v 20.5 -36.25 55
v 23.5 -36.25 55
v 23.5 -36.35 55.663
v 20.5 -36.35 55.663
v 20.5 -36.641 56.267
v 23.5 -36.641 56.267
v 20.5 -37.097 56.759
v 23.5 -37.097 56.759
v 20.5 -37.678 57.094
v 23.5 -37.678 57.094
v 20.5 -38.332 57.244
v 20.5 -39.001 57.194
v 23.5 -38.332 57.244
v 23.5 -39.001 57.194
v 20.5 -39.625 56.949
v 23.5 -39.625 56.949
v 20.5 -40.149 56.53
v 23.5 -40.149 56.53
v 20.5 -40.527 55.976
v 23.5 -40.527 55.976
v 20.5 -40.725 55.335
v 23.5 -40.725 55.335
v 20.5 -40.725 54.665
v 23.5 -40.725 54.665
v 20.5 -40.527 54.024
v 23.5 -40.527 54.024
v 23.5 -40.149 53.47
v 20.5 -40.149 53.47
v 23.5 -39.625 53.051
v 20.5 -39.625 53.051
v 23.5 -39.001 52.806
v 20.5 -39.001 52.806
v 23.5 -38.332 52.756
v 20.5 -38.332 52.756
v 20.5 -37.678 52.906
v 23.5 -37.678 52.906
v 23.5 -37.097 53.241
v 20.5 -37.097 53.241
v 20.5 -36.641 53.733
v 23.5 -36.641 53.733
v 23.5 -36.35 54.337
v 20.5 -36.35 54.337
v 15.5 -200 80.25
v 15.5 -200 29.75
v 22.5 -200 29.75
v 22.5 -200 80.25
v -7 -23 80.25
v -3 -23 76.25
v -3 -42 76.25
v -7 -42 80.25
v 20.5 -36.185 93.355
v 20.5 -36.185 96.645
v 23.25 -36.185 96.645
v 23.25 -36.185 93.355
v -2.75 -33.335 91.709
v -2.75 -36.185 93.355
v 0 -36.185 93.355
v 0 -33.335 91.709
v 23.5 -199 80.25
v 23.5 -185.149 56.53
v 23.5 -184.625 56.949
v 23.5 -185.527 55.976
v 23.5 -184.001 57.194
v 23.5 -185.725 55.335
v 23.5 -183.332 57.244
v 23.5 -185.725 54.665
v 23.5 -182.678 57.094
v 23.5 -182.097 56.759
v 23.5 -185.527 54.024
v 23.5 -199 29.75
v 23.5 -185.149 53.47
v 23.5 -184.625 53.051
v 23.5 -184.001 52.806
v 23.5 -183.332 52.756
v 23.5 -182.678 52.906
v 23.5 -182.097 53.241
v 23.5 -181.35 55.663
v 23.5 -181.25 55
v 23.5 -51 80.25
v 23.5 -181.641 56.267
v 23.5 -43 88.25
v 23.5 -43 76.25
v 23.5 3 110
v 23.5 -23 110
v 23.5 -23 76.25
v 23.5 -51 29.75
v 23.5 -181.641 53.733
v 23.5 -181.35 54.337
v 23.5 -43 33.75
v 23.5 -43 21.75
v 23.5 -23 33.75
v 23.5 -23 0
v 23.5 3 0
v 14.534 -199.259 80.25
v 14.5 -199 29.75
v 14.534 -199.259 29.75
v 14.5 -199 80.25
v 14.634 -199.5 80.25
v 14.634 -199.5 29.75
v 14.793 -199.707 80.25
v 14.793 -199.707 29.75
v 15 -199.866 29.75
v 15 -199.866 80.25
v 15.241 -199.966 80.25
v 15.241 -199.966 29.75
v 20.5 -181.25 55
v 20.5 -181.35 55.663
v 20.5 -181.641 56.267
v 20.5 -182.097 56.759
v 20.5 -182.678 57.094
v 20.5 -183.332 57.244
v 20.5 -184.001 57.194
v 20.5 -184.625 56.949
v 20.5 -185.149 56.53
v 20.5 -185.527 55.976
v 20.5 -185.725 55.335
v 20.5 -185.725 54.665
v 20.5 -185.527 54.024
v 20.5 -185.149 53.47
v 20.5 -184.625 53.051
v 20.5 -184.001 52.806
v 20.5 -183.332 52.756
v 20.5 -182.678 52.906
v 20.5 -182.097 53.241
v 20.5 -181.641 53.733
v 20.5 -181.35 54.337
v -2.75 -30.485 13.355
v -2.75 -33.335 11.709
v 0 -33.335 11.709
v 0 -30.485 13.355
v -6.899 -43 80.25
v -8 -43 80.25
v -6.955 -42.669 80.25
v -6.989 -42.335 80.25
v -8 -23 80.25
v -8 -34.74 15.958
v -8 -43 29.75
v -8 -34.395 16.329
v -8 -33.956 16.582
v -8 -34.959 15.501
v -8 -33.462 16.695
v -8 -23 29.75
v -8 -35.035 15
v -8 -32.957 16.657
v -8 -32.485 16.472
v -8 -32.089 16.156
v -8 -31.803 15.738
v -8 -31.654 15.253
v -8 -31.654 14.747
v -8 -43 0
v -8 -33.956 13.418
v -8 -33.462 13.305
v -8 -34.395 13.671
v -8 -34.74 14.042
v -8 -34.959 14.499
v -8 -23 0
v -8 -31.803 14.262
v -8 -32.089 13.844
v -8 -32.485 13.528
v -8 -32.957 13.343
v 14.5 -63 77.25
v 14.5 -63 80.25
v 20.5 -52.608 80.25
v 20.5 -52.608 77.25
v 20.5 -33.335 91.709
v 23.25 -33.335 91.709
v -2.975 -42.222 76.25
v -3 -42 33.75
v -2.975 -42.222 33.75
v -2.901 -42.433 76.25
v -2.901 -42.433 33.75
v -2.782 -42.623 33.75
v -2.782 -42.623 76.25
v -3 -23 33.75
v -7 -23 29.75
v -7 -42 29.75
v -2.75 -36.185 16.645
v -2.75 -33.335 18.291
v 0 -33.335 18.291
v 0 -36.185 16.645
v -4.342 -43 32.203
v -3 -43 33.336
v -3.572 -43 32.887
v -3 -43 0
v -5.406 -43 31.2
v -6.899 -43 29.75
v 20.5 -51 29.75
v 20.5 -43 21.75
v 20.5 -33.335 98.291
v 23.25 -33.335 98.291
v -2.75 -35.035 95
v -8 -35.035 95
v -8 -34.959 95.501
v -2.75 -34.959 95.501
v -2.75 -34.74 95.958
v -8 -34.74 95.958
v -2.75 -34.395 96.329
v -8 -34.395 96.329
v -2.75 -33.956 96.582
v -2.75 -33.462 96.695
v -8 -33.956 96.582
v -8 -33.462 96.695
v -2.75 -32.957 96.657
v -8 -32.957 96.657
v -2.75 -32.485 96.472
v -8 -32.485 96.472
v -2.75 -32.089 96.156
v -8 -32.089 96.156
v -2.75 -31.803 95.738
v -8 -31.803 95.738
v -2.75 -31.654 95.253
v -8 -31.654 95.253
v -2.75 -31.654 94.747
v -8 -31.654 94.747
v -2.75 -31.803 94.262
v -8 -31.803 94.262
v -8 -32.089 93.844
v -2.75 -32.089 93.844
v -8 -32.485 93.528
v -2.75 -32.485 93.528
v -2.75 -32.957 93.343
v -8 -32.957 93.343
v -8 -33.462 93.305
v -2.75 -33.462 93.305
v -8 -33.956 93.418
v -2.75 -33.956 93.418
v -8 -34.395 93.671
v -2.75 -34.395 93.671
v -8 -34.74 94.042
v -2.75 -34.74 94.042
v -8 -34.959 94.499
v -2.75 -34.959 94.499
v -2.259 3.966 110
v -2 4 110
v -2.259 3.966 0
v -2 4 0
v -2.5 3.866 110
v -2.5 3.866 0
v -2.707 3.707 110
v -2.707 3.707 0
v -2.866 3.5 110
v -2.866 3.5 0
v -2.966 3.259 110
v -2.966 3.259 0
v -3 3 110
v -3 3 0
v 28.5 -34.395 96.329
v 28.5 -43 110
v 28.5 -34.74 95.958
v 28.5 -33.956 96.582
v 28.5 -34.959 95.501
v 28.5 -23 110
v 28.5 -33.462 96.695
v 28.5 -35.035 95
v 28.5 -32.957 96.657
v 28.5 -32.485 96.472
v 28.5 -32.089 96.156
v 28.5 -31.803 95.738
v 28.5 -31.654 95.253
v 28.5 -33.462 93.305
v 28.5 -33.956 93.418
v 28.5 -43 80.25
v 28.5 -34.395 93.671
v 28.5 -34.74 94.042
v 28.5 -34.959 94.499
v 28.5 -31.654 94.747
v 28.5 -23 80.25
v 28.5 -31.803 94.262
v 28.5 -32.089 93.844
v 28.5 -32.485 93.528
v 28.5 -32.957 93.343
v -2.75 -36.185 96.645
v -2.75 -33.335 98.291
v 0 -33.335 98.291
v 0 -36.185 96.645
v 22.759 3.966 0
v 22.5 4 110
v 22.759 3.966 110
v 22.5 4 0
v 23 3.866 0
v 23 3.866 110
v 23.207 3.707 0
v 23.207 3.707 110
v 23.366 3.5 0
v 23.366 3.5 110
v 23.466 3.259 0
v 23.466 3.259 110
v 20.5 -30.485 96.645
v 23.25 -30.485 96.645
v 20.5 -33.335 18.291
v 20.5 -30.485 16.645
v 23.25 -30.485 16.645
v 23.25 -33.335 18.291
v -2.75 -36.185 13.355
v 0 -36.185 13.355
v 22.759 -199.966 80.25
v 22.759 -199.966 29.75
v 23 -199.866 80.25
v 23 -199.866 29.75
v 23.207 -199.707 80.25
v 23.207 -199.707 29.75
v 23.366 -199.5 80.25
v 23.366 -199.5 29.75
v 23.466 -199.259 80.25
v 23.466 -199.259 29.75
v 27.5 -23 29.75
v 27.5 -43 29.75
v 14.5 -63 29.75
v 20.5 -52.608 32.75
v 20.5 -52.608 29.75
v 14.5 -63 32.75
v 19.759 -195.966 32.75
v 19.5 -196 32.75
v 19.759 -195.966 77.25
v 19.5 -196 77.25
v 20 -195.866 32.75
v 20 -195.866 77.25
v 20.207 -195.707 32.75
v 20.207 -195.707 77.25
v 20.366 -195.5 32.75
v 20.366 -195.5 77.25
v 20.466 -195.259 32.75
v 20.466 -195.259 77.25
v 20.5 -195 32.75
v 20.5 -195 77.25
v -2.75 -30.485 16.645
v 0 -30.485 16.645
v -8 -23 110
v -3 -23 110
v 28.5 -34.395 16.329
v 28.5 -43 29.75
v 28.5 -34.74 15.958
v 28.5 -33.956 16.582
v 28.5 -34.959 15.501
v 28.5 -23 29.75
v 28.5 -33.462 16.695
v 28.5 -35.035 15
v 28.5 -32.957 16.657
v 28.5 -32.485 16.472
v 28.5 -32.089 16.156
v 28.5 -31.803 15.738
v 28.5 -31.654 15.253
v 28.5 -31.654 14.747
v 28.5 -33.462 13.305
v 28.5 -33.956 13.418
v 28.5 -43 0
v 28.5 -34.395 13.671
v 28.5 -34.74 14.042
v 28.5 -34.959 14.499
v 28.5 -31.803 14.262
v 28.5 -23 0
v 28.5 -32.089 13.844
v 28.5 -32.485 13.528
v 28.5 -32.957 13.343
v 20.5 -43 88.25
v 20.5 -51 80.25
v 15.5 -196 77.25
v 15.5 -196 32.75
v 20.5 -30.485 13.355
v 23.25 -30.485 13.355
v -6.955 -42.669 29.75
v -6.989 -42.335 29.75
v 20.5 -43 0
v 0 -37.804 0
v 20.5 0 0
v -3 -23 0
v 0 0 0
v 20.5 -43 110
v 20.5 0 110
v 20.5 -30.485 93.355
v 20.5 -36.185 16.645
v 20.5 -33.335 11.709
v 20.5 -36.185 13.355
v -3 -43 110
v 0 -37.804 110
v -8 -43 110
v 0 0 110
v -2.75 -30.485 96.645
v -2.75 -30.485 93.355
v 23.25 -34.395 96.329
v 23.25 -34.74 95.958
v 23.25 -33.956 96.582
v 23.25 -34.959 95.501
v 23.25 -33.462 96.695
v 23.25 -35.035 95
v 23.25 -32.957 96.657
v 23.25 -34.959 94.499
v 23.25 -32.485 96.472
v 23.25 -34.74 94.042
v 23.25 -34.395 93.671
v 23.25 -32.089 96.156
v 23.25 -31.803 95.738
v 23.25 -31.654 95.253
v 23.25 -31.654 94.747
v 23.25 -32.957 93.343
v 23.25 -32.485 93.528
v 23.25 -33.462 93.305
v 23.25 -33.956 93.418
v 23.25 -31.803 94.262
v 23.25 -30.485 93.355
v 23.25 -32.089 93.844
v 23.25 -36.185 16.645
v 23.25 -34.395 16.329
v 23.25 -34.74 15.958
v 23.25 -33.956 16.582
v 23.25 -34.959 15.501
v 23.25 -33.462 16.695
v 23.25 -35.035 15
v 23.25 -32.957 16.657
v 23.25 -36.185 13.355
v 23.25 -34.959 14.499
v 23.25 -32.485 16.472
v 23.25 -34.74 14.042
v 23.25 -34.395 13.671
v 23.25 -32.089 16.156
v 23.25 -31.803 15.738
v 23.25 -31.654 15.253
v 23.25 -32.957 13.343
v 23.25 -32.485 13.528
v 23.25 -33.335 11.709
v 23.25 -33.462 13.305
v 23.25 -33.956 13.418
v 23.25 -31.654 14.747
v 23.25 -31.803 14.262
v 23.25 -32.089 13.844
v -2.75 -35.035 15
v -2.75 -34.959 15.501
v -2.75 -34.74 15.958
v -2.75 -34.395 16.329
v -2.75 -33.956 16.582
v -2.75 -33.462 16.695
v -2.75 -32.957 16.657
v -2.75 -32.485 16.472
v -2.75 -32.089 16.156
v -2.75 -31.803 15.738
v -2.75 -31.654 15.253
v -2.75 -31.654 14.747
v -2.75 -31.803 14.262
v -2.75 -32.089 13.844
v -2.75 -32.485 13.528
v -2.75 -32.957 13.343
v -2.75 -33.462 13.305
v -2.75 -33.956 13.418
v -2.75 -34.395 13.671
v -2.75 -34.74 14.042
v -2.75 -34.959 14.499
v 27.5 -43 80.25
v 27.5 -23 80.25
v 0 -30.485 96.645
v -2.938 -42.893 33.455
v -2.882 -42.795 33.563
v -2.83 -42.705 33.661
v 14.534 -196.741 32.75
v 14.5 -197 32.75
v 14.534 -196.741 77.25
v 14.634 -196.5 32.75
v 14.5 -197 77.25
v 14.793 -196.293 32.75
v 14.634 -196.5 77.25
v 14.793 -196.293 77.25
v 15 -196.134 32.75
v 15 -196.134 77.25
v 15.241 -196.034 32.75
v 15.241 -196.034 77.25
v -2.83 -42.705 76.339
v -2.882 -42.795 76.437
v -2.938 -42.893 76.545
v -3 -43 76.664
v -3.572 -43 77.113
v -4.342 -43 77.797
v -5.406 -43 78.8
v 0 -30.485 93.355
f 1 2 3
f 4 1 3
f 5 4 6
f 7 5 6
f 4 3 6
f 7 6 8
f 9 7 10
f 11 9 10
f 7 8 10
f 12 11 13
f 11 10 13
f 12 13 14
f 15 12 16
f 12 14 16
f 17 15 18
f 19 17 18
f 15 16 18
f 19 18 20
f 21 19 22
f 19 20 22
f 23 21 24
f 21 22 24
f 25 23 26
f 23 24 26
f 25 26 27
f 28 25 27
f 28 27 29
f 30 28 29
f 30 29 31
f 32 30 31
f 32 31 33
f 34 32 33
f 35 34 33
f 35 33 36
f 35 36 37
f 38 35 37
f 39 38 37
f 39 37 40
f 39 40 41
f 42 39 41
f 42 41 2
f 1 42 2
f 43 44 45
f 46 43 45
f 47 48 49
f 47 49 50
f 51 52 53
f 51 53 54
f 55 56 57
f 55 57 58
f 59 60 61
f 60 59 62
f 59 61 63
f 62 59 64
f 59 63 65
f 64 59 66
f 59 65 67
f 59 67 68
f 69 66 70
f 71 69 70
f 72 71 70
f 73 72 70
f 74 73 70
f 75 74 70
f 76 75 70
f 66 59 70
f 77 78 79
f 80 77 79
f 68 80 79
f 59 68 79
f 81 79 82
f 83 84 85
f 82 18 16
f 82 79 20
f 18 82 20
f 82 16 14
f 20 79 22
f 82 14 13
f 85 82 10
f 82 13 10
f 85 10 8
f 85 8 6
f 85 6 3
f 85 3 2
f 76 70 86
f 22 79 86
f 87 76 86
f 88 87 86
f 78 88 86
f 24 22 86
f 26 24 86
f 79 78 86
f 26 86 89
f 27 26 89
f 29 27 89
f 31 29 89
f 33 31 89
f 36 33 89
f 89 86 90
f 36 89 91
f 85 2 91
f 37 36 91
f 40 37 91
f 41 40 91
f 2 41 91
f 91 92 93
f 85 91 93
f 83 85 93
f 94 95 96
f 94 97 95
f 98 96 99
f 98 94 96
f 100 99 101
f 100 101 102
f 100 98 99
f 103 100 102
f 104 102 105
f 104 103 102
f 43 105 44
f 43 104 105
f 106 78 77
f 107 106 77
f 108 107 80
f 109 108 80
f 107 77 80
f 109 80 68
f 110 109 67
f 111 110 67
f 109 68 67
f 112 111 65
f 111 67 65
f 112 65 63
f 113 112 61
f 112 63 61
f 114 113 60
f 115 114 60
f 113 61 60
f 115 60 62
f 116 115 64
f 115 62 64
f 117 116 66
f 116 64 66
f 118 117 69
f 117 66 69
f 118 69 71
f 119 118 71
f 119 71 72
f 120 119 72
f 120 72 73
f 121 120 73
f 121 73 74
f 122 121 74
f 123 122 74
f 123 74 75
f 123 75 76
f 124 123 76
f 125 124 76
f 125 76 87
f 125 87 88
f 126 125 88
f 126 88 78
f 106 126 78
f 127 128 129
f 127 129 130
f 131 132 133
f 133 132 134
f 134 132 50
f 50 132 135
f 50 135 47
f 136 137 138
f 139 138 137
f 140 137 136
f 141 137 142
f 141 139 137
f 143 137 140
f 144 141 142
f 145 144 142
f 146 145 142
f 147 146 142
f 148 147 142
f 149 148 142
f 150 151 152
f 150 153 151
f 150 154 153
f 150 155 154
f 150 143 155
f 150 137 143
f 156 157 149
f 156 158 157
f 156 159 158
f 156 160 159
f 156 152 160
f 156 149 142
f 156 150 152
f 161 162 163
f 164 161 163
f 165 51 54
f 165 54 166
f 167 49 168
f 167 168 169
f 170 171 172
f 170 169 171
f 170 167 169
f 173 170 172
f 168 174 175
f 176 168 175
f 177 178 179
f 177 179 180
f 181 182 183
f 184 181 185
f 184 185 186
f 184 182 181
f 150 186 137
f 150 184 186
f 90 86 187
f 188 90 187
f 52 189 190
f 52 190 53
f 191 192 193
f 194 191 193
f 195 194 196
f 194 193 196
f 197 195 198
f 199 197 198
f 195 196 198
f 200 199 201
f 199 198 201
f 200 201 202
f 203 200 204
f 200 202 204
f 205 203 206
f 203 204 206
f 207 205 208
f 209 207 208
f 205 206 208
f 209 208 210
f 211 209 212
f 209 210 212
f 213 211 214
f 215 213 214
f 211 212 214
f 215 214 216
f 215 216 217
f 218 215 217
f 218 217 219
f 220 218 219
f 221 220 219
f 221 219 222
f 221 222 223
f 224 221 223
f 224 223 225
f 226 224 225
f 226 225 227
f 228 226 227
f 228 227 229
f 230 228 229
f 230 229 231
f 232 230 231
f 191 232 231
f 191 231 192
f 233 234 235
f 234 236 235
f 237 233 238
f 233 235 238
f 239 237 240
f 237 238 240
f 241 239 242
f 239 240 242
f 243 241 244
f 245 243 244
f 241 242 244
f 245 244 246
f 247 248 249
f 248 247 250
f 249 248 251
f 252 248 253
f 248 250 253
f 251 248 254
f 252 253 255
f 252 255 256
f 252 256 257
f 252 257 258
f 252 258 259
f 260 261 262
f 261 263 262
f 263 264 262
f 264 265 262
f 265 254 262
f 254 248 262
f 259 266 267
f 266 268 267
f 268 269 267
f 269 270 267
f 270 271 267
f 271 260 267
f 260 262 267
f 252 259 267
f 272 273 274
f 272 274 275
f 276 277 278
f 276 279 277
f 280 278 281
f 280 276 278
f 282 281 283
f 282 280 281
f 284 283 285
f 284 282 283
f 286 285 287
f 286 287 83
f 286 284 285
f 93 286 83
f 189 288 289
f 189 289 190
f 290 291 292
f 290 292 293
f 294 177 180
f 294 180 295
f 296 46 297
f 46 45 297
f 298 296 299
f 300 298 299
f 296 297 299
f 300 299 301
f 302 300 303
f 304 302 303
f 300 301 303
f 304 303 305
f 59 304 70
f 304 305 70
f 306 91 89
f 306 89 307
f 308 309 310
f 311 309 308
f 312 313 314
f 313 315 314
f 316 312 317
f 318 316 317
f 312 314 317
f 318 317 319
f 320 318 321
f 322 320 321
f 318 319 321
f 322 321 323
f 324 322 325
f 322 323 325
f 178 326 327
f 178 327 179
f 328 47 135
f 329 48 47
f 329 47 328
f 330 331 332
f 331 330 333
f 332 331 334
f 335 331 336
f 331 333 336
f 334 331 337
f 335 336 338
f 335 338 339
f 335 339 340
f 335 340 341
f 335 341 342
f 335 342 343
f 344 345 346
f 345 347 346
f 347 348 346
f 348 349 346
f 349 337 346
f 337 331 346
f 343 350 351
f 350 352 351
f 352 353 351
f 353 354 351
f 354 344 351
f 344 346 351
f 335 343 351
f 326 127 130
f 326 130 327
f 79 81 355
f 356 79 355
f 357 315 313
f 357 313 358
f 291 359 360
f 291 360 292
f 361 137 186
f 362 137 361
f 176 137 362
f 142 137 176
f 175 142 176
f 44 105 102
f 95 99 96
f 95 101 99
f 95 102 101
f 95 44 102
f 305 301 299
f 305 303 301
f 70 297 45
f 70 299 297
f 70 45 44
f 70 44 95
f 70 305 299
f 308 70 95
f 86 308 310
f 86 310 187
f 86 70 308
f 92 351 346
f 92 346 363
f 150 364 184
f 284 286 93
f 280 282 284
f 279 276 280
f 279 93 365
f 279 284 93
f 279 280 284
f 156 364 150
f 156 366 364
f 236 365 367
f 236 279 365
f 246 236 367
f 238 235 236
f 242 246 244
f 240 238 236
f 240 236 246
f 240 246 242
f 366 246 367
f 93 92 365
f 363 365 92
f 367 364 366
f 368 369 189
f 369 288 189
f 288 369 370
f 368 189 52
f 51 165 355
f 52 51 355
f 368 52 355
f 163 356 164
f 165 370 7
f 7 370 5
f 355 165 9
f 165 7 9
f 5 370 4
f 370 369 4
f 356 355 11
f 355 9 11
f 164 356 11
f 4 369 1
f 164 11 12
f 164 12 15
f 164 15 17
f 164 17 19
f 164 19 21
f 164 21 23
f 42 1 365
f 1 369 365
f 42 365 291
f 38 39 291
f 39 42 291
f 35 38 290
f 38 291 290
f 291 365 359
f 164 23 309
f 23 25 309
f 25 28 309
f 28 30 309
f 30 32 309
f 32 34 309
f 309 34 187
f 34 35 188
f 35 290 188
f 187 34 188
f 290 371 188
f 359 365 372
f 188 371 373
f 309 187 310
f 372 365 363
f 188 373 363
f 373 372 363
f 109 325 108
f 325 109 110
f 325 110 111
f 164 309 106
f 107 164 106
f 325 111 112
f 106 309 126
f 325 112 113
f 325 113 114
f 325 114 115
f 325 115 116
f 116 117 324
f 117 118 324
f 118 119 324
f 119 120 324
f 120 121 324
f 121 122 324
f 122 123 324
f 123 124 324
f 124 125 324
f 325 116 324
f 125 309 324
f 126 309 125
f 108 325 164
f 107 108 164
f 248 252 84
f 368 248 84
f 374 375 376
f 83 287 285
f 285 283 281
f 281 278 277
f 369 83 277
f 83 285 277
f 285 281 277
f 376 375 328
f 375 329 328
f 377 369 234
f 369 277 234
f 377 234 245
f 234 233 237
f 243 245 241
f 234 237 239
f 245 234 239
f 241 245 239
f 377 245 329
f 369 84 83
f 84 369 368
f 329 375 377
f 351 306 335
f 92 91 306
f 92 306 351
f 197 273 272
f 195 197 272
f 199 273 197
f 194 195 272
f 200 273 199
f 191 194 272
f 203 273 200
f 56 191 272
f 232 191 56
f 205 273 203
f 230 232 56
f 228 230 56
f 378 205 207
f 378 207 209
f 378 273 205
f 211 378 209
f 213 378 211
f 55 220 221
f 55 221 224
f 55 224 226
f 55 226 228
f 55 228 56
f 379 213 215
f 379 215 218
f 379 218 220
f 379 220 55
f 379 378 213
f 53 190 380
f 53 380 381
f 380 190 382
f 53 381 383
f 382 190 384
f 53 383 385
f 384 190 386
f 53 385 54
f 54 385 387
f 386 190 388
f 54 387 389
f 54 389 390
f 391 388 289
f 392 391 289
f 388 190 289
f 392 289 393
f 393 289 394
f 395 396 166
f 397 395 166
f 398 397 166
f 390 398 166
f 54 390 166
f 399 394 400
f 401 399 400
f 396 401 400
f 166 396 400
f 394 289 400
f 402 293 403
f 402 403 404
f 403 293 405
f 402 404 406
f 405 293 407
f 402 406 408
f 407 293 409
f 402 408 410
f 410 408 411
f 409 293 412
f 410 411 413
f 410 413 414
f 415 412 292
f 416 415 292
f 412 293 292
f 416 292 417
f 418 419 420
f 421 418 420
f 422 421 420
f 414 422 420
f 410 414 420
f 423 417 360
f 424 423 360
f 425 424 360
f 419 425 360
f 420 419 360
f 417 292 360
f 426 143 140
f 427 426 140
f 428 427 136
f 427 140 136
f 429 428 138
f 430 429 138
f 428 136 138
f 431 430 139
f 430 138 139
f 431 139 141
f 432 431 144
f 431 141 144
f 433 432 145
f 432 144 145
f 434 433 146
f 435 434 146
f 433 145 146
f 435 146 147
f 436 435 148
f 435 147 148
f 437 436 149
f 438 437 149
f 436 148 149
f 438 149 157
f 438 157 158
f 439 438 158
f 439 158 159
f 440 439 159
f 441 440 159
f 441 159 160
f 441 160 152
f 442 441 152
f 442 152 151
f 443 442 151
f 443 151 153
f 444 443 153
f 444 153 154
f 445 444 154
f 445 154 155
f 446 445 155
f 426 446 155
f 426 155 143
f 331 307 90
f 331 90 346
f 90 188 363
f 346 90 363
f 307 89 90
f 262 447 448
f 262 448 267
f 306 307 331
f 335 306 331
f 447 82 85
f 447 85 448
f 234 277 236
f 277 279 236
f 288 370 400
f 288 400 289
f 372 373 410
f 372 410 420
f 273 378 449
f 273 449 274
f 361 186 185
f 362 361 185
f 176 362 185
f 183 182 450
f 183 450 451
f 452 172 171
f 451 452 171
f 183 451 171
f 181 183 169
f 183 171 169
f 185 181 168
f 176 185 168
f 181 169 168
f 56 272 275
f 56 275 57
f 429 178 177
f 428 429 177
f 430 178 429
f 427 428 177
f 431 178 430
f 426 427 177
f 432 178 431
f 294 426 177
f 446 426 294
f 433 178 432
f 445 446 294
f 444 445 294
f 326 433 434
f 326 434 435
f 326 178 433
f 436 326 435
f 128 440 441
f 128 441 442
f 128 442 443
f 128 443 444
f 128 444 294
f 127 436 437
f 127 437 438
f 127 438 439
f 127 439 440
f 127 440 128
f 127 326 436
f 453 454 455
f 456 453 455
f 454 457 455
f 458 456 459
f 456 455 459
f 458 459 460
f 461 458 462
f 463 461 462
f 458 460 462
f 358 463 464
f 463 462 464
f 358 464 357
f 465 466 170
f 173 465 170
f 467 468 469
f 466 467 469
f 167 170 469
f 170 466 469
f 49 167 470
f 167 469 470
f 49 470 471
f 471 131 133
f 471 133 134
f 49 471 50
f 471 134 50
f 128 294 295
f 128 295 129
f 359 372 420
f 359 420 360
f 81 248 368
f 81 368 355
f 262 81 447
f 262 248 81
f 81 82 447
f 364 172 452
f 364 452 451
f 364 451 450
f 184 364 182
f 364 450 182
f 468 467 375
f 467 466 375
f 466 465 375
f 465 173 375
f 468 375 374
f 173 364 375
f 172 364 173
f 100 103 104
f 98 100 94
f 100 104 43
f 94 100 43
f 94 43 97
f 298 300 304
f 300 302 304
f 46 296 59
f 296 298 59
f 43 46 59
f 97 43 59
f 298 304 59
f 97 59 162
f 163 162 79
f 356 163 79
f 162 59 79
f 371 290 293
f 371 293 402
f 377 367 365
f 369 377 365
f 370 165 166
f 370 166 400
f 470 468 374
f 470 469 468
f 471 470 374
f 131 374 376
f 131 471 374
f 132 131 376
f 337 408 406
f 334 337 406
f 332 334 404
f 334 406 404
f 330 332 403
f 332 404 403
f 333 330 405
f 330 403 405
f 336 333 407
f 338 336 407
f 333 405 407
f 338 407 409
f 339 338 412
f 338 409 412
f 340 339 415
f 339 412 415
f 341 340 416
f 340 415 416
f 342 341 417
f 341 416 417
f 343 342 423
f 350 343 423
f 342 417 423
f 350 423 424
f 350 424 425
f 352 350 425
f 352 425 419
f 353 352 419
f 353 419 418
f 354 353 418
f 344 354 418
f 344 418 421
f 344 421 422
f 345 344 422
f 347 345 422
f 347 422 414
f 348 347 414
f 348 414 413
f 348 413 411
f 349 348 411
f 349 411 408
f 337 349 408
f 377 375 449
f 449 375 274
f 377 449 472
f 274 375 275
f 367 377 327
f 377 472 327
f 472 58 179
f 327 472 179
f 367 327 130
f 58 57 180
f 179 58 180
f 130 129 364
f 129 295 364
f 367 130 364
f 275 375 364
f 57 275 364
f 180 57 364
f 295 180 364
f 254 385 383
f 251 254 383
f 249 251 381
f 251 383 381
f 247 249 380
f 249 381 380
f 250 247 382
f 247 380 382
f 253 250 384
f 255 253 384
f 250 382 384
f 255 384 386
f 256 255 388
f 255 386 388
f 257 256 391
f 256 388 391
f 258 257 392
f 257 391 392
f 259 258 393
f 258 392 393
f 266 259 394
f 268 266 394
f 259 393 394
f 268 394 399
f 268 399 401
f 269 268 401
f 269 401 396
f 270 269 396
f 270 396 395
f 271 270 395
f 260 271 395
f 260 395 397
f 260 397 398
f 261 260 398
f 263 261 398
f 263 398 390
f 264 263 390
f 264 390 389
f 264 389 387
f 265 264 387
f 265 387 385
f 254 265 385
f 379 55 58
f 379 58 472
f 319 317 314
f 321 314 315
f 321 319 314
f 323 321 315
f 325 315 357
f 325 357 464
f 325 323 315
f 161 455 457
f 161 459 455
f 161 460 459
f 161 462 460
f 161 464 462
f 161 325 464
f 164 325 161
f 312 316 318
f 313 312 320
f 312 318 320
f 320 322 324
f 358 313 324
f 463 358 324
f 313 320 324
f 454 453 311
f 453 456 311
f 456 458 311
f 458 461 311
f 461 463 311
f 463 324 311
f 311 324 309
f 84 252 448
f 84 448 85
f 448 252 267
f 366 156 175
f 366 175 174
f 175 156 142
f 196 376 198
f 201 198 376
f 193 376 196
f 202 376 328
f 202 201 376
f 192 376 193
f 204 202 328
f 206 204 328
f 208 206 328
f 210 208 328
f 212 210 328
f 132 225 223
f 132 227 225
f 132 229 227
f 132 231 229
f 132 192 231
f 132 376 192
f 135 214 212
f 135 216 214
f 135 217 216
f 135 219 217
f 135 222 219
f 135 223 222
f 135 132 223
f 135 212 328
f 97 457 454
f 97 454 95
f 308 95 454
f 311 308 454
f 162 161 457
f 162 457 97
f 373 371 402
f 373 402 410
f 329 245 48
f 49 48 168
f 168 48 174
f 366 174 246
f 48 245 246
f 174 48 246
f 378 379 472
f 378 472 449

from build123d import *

# Parameters (mm, degrees)
EXTRUDE_1_DEPTH          = 110
SKETCH_3_W               = 5
SKETCH_3_H               = 20
EXTRUDE_2_DEPTH          = 110
CUT_EXTRUDE_1_REACH      = 232.418
SKETCH_2_R               = 2.25
SKETCH_5_W               = 5
SKETCH_5_H               = 50.5
CUT_EXTRUDE_2_DEPTH      = 234.512847612
SKETCH_6_W               = 29.75
SKETCH_6_H               = 157
CUT_EXTRUDE_3_DEPTH      = 10
SKETCH_7_W               = 3
SKETCH_7_H               = 145
EXTRUDE_3_DEPTH          = 6
FILLET_1_R               = 1
CHAMFER_1_SIZE           = 8
CHAMFER_2_SIZE           = 4
SKETCH_8_R               = 1.7
CUT_EXTRUDE_4_DEPTH      = 232.154169333
CUT_EXTRUDE_5_DEPTH      = 13
CUT_EXTRUDE_5_DEPTH_BACK = 13
CHAMFER_3_SIZE           = 12
CHAMFER_3_SIZE_2         = 6.92820323
CHAMFER_4_SIZE           = 5.196152423
CHAMFER_4_SIZE_2         = 3


with BuildPart() as part:
    # 草图1 → 凸台-拉伸1 (new body)
    with BuildSketch(Plane.XY):
        Polygon((0, 0), (20.5, 0), (20.5, -196), (14.5, -196), (14.5, -200), (23.5, -200), (23.5, 4), (-3, 4), (-3, -43), (0, -43), align=None)
    extrude(amount=EXTRUDE_1_DEPTH)

    # 草图3 → 凸台-拉伸2 (add)
    with BuildSketch(Plane(origin=(0, 0, 0), x_dir=(-1, 0, 0), z_dir=(0, 0, -1))):
        with Locations((-26, -33)):
            Rectangle(SKETCH_3_W, SKETCH_3_H)
        with Locations((5.5, -33)):
            Rectangle(SKETCH_3_W, SKETCH_3_H)
    extrude(amount=-EXTRUDE_2_DEPTH)

    # 草图2 → 切除-拉伸1 (cut, up to next)
    with BuildSketch(Plane(origin=(23.5, 0, 0), x_dir=(0, 0, -1), z_dir=(1, 0, 0)), mode=Mode.PRIVATE) as cut_extrude_1_sk1:
        with Locations(Location((-55, -38.5, 0), (0, 0, 90))):
            Circle(SKETCH_2_R)
    cut_extrude_1_tool1 = extrude(cut_extrude_1_sk1.sketch, amount=-CUT_EXTRUDE_1_REACH, mode=Mode.PRIVATE) & part.part
    # 草图2 → 切除-拉伸1 (cut, up to next)
    with BuildSketch(Plane(origin=(23.5, 0, 0), x_dir=(0, 0, -1), z_dir=(1, 0, 0)), mode=Mode.PRIVATE) as cut_extrude_1_sk2:
        with Locations(Location((-55, -183.5, 0), (0, 0, 90))):
            Circle(SKETCH_2_R)
    cut_extrude_1_tool2 = extrude(cut_extrude_1_sk2.sketch, amount=-CUT_EXTRUDE_1_REACH, mode=Mode.PRIVATE) & part.part
    add(cut_extrude_1_tool1.solids().sort_by_distance((23.5, -38.5, 55))[0], mode=Mode.SUBTRACT)
    add(cut_extrude_1_tool2.solids().sort_by_distance((23.5, -183.5, 55))[0], mode=Mode.SUBTRACT)

    # 草图5 → 切除-拉伸2 (cut, through all)
    with BuildSketch(Plane(origin=(0, 4, 0), x_dir=(1, 0, 0), z_dir=(0, 1, 0))):
        with Locations((-5.5, -55)):
            Rectangle(SKETCH_5_W, SKETCH_5_H)
        with Locations((26, -55)):
            Rectangle(SKETCH_5_W, SKETCH_5_H)
    extrude(amount=-CUT_EXTRUDE_2_DEPTH, mode=Mode.SUBTRACT)

    # 草图6 → 切除-拉伸3 (cut)
    with BuildSketch(Plane(origin=(23.5, 0, 0), x_dir=(0, 0, -1), z_dir=(1, 0, 0))):
        with Locations((-95.125, -121.5)):
            Rectangle(SKETCH_6_W, SKETCH_6_H)
        with Locations((-14.875, -121.5)):
            Rectangle(SKETCH_6_W, SKETCH_6_H)
    extrude(amount=-CUT_EXTRUDE_3_DEPTH, mode=Mode.SUBTRACT)

    # 草图7 → 凸台-拉伸3 (add)
    with BuildSketch(Plane.ZY.offset(-20.5)):
        with Locations((31.25, -123.5)):
            Rectangle(SKETCH_7_W, SKETCH_7_H)
        with Locations((78.75, -123.5)):
            Rectangle(SKETCH_7_W, SKETCH_7_H)
    extrude(amount=EXTRUDE_3_DEPTH)

    # 圆角1
    fillet_1_edges = [part.edges().sort_by_distance(p)[0] for p in [
        (23.5, -200, 55),
        (14.5, -200, 55),
        (-3, 4, 55),
        (23.5, 4, 55),
        (14.5, -196, 55),
        (20.5, -196, 55),
        (-3, -43, 55),
    ]]
    fillet(fillet_1_edges, radius=FILLET_1_R)

    # 倒角1
    chamfer_1_edges = [part.edges().sort_by_distance(p)[0] for p in [
        (22, -43, 80.25),
        (22, -43, 29.75),
    ]]
    chamfer(chamfer_1_edges, length=CHAMFER_1_SIZE)

    # 倒角2
    # the kernel refuses this chamfer: 4 mm, written as the material it adds along each edge
    with BuildSketch(Plane(origin=(-3, -23, 29.75), x_dir=(0.027495876610586726, 0, 0.9996219169112968), z_dir=(0, -1, 0))) as chamfer_2_piece_1:
        Polygon((CHAMFER_2_SIZE * 0.999621916911, CHAMFER_2_SIZE * 0.0274958766106), (-CHAMFER_2_SIZE * 0.0274958766106, CHAMFER_2_SIZE * 0.999621916911), (0, 0), align=None)
    extrude(amount=19)
    with BuildSketch(Plane(origin=(-3, -23, 80.25), x_dir=(0.027495876610584242, 0, -0.9996219169112968), z_dir=(0, -1, 0))) as chamfer_2_piece_2:
        Polygon((CHAMFER_2_SIZE * 0.999621916911, -CHAMFER_2_SIZE * 0.0274958766106), (-CHAMFER_2_SIZE * 0.0274958766106, -CHAMFER_2_SIZE * 0.999621916911), (0, 0), align=None)
    extrude(amount=19)
    with BuildSketch(Plane(origin=(-2, -42, 29.75), x_dir=(-0.9999802608561371, 0.0062831439655610674, 0), z_dir=(-0.0062831439655610674, -0.9999802608561371, 0))) as chamfer_2_piece_3_section:
        Polygon((-1 - CHAMFER_2_SIZE, 0), (-1, -CHAMFER_2_SIZE), (-1, 0), align=None)
    chamfer_2_piece_3 = revolve(axis=Axis((-2, -42, 29.75), (0, 0, -1)), revolution_arc=359.64, mode=Mode.PRIVATE)
    chamfer_2_piece_3 = split(chamfer_2_piece_3, bisect_by=Plane(origin=(0, -42.77460492, 31.688294831), z_dir=(-1, 0, 0)), keep=Keep.TOP, mode=Mode.PRIVATE)
    chamfer_2_piece_3 = split(chamfer_2_piece_3, bisect_by=Plane(origin=(-2.77460492, -43, 31.688294831), z_dir=(0, 1, 0)), keep=Keep.TOP, mode=Mode.PRIVATE)
    add(chamfer_2_piece_3)
    with BuildSketch(Plane(origin=(-2, -42, 80.25), x_dir=(-0.9999802608561371, 0.0062831439655610674, 0), z_dir=(-0.0062831439655610674, -0.9999802608561371, 0))) as chamfer_2_piece_4_section:
        Polygon((-1, CHAMFER_2_SIZE), (-1 - CHAMFER_2_SIZE, 0), (-1, 0), align=None)
    chamfer_2_piece_4 = revolve(axis=Axis((-2, -42, 80.25), (0, 0, -1)), revolution_arc=359.64, mode=Mode.PRIVATE)
    chamfer_2_piece_4 = split(chamfer_2_piece_4, bisect_by=Plane(origin=(0, -42.77460492, 78.31170517), z_dir=(-1, 0, 0)), keep=Keep.TOP, mode=Mode.PRIVATE)
    chamfer_2_piece_4 = split(chamfer_2_piece_4, bisect_by=Plane(origin=(-2.77460492, -43, 78.31170517), z_dir=(0, 1, 0)), keep=Keep.TOP, mode=Mode.PRIVATE)
    add(chamfer_2_piece_4)
    with BuildSketch(Plane(origin=(23.5, -23, 80.25), x_dir=(-0.027495876610602904, 0, -0.9996219169112963), z_dir=(0, -1, 0))) as chamfer_2_piece_5:
        Polygon((CHAMFER_2_SIZE * 0.999621916911, CHAMFER_2_SIZE * 0.0274958766106), (-CHAMFER_2_SIZE * 0.0274958766106, CHAMFER_2_SIZE * 0.999621916911), (0, 0), align=None)
    extrude(amount=20)
    with BuildSketch(Plane(origin=(23.5, -23, 29.75), x_dir=(-0.02749587661060549, 0, 0.9996219169112961), z_dir=(0, -1, 0))) as chamfer_2_piece_6:
        Polygon((CHAMFER_2_SIZE * 0.999621916911, -CHAMFER_2_SIZE * 0.0274958766106), (-CHAMFER_2_SIZE * 0.0274958766106, -CHAMFER_2_SIZE * 0.999621916911), (0, 0), align=None)
    extrude(amount=20)

    # 草图8 → 切除-拉伸4 (cut, through all)
    with BuildSketch(Plane.ZY.offset(8)):
        with Locations(Location((15, -33.335006201, 0), (0, 0, 270))):
            Circle(SKETCH_8_R)
        with Locations(Location((95, -33.335006201, 0), (0, 0, 270))):
            Circle(SKETCH_8_R)
    extrude(amount=-CUT_EXTRUDE_4_DEPTH, mode=Mode.SUBTRACT)

    # 草图9 → 切除-拉伸5 (cut, two sides: drawn at the far end of the back side and taken through both)
    with BuildSketch(Plane(origin=(10.25, 0, 0), x_dir=(0, 0, -1), z_dir=(1, 0, 0)).offset(-CUT_EXTRUDE_5_DEPTH_BACK)):
        Polygon((-93.354551733, -30.485006201), (-96.645448267, -30.485006201), (-98.290896534, -33.335006201), (-96.645448267, -36.185006201), (-93.354551733, -36.185006201), (-91.709103466, -33.335006201), align=None)
        Polygon((-13.354551733, -30.485006201), (-16.645448267, -30.485006201), (-18.290896534, -33.335006201), (-16.645448267, -36.185006201), (-13.354551733, -36.185006201), (-11.709103466, -33.335006201), align=None)
    extrude(amount=CUT_EXTRUDE_5_DEPTH + CUT_EXTRUDE_5_DEPTH_BACK, mode=Mode.SUBTRACT)

    # 倒角3
    # the kernel refuses this chamfer: 12, 6.92820323 mm, written as the material it takes off along each edge
    with BuildSketch(Plane(origin=(14.5, -51, 111.295029056), x_dir=(-0.019326765612700716, -0.9998132206222078, -4.736066806866801e-15), z_dir=(0, 0, -1))) as chamfer_3_piece_1_section:
        Polygon((CHAMFER_3_SIZE * 0.999813220622, -CHAMFER_3_SIZE * 0.0193267656127), (-CHAMFER_3_SIZE_2 * 0.0193267656135, -CHAMFER_3_SIZE_2 * 0.999813220662), (0, 0), align=None)
    chamfer_3_piece_1 = extrude(amount=65.090058112, mode=Mode.PRIVATE)
    chamfer_3_piece_1 = split(chamfer_3_piece_1, bisect_by=Plane(origin=(20.5, -55.138426071, 78.75), z_dir=(-1, 0, 0)), keep=Keep.TOP, mode=Mode.PRIVATE)
    add(chamfer_3_piece_1, mode=Mode.SUBTRACT)
    with BuildSketch(Plane(origin=(14.5, -51, 63.795029056), x_dir=(0.9983227437537925, 0.0578938624026711, 0), z_dir=(0, 0, -1))) as chamfer_3_piece_2_section:
        Polygon((CHAMFER_3_SIZE_2 * 0.998322743793, CHAMFER_3_SIZE_2 * 0.057893862405), (-CHAMFER_3_SIZE * 0.0578938624027, CHAMFER_3_SIZE * 0.998322743754), (0, 0), align=None)
    chamfer_3_piece_2 = extrude(amount=65.090058112, mode=Mode.PRIVATE)
    chamfer_3_piece_2 = split(chamfer_3_piece_2, bisect_by=Plane(origin=(20.5, -55.138426071, 31.25), z_dir=(-1, 0, 0)), keep=Keep.TOP, mode=Mode.PRIVATE)
    add(chamfer_3_piece_2, mode=Mode.SUBTRACT)

    # 倒角4
    # the kernel refuses this chamfer: 5.196152423, 3 mm, written as the material it takes off along each edge
    with BuildSketch(Plane(origin=(0, -43, 123.442891912), x_dir=(0.01932676561270063, 0.9998132206222079, 0), z_dir=(0, 0, -1))) as chamfer_4_piece_1:
        Polygon((CHAMFER_4_SIZE * 0.999813220566, -CHAMFER_4_SIZE * 0.0193267656116), (-CHAMFER_4_SIZE_2 * 0.0193267656127, -CHAMFER_4_SIZE_2 * 0.999813220622), (0, 0), align=None)
    extrude(amount=136.885783824, mode=Mode.SUBTRACT)


solid = part.part
